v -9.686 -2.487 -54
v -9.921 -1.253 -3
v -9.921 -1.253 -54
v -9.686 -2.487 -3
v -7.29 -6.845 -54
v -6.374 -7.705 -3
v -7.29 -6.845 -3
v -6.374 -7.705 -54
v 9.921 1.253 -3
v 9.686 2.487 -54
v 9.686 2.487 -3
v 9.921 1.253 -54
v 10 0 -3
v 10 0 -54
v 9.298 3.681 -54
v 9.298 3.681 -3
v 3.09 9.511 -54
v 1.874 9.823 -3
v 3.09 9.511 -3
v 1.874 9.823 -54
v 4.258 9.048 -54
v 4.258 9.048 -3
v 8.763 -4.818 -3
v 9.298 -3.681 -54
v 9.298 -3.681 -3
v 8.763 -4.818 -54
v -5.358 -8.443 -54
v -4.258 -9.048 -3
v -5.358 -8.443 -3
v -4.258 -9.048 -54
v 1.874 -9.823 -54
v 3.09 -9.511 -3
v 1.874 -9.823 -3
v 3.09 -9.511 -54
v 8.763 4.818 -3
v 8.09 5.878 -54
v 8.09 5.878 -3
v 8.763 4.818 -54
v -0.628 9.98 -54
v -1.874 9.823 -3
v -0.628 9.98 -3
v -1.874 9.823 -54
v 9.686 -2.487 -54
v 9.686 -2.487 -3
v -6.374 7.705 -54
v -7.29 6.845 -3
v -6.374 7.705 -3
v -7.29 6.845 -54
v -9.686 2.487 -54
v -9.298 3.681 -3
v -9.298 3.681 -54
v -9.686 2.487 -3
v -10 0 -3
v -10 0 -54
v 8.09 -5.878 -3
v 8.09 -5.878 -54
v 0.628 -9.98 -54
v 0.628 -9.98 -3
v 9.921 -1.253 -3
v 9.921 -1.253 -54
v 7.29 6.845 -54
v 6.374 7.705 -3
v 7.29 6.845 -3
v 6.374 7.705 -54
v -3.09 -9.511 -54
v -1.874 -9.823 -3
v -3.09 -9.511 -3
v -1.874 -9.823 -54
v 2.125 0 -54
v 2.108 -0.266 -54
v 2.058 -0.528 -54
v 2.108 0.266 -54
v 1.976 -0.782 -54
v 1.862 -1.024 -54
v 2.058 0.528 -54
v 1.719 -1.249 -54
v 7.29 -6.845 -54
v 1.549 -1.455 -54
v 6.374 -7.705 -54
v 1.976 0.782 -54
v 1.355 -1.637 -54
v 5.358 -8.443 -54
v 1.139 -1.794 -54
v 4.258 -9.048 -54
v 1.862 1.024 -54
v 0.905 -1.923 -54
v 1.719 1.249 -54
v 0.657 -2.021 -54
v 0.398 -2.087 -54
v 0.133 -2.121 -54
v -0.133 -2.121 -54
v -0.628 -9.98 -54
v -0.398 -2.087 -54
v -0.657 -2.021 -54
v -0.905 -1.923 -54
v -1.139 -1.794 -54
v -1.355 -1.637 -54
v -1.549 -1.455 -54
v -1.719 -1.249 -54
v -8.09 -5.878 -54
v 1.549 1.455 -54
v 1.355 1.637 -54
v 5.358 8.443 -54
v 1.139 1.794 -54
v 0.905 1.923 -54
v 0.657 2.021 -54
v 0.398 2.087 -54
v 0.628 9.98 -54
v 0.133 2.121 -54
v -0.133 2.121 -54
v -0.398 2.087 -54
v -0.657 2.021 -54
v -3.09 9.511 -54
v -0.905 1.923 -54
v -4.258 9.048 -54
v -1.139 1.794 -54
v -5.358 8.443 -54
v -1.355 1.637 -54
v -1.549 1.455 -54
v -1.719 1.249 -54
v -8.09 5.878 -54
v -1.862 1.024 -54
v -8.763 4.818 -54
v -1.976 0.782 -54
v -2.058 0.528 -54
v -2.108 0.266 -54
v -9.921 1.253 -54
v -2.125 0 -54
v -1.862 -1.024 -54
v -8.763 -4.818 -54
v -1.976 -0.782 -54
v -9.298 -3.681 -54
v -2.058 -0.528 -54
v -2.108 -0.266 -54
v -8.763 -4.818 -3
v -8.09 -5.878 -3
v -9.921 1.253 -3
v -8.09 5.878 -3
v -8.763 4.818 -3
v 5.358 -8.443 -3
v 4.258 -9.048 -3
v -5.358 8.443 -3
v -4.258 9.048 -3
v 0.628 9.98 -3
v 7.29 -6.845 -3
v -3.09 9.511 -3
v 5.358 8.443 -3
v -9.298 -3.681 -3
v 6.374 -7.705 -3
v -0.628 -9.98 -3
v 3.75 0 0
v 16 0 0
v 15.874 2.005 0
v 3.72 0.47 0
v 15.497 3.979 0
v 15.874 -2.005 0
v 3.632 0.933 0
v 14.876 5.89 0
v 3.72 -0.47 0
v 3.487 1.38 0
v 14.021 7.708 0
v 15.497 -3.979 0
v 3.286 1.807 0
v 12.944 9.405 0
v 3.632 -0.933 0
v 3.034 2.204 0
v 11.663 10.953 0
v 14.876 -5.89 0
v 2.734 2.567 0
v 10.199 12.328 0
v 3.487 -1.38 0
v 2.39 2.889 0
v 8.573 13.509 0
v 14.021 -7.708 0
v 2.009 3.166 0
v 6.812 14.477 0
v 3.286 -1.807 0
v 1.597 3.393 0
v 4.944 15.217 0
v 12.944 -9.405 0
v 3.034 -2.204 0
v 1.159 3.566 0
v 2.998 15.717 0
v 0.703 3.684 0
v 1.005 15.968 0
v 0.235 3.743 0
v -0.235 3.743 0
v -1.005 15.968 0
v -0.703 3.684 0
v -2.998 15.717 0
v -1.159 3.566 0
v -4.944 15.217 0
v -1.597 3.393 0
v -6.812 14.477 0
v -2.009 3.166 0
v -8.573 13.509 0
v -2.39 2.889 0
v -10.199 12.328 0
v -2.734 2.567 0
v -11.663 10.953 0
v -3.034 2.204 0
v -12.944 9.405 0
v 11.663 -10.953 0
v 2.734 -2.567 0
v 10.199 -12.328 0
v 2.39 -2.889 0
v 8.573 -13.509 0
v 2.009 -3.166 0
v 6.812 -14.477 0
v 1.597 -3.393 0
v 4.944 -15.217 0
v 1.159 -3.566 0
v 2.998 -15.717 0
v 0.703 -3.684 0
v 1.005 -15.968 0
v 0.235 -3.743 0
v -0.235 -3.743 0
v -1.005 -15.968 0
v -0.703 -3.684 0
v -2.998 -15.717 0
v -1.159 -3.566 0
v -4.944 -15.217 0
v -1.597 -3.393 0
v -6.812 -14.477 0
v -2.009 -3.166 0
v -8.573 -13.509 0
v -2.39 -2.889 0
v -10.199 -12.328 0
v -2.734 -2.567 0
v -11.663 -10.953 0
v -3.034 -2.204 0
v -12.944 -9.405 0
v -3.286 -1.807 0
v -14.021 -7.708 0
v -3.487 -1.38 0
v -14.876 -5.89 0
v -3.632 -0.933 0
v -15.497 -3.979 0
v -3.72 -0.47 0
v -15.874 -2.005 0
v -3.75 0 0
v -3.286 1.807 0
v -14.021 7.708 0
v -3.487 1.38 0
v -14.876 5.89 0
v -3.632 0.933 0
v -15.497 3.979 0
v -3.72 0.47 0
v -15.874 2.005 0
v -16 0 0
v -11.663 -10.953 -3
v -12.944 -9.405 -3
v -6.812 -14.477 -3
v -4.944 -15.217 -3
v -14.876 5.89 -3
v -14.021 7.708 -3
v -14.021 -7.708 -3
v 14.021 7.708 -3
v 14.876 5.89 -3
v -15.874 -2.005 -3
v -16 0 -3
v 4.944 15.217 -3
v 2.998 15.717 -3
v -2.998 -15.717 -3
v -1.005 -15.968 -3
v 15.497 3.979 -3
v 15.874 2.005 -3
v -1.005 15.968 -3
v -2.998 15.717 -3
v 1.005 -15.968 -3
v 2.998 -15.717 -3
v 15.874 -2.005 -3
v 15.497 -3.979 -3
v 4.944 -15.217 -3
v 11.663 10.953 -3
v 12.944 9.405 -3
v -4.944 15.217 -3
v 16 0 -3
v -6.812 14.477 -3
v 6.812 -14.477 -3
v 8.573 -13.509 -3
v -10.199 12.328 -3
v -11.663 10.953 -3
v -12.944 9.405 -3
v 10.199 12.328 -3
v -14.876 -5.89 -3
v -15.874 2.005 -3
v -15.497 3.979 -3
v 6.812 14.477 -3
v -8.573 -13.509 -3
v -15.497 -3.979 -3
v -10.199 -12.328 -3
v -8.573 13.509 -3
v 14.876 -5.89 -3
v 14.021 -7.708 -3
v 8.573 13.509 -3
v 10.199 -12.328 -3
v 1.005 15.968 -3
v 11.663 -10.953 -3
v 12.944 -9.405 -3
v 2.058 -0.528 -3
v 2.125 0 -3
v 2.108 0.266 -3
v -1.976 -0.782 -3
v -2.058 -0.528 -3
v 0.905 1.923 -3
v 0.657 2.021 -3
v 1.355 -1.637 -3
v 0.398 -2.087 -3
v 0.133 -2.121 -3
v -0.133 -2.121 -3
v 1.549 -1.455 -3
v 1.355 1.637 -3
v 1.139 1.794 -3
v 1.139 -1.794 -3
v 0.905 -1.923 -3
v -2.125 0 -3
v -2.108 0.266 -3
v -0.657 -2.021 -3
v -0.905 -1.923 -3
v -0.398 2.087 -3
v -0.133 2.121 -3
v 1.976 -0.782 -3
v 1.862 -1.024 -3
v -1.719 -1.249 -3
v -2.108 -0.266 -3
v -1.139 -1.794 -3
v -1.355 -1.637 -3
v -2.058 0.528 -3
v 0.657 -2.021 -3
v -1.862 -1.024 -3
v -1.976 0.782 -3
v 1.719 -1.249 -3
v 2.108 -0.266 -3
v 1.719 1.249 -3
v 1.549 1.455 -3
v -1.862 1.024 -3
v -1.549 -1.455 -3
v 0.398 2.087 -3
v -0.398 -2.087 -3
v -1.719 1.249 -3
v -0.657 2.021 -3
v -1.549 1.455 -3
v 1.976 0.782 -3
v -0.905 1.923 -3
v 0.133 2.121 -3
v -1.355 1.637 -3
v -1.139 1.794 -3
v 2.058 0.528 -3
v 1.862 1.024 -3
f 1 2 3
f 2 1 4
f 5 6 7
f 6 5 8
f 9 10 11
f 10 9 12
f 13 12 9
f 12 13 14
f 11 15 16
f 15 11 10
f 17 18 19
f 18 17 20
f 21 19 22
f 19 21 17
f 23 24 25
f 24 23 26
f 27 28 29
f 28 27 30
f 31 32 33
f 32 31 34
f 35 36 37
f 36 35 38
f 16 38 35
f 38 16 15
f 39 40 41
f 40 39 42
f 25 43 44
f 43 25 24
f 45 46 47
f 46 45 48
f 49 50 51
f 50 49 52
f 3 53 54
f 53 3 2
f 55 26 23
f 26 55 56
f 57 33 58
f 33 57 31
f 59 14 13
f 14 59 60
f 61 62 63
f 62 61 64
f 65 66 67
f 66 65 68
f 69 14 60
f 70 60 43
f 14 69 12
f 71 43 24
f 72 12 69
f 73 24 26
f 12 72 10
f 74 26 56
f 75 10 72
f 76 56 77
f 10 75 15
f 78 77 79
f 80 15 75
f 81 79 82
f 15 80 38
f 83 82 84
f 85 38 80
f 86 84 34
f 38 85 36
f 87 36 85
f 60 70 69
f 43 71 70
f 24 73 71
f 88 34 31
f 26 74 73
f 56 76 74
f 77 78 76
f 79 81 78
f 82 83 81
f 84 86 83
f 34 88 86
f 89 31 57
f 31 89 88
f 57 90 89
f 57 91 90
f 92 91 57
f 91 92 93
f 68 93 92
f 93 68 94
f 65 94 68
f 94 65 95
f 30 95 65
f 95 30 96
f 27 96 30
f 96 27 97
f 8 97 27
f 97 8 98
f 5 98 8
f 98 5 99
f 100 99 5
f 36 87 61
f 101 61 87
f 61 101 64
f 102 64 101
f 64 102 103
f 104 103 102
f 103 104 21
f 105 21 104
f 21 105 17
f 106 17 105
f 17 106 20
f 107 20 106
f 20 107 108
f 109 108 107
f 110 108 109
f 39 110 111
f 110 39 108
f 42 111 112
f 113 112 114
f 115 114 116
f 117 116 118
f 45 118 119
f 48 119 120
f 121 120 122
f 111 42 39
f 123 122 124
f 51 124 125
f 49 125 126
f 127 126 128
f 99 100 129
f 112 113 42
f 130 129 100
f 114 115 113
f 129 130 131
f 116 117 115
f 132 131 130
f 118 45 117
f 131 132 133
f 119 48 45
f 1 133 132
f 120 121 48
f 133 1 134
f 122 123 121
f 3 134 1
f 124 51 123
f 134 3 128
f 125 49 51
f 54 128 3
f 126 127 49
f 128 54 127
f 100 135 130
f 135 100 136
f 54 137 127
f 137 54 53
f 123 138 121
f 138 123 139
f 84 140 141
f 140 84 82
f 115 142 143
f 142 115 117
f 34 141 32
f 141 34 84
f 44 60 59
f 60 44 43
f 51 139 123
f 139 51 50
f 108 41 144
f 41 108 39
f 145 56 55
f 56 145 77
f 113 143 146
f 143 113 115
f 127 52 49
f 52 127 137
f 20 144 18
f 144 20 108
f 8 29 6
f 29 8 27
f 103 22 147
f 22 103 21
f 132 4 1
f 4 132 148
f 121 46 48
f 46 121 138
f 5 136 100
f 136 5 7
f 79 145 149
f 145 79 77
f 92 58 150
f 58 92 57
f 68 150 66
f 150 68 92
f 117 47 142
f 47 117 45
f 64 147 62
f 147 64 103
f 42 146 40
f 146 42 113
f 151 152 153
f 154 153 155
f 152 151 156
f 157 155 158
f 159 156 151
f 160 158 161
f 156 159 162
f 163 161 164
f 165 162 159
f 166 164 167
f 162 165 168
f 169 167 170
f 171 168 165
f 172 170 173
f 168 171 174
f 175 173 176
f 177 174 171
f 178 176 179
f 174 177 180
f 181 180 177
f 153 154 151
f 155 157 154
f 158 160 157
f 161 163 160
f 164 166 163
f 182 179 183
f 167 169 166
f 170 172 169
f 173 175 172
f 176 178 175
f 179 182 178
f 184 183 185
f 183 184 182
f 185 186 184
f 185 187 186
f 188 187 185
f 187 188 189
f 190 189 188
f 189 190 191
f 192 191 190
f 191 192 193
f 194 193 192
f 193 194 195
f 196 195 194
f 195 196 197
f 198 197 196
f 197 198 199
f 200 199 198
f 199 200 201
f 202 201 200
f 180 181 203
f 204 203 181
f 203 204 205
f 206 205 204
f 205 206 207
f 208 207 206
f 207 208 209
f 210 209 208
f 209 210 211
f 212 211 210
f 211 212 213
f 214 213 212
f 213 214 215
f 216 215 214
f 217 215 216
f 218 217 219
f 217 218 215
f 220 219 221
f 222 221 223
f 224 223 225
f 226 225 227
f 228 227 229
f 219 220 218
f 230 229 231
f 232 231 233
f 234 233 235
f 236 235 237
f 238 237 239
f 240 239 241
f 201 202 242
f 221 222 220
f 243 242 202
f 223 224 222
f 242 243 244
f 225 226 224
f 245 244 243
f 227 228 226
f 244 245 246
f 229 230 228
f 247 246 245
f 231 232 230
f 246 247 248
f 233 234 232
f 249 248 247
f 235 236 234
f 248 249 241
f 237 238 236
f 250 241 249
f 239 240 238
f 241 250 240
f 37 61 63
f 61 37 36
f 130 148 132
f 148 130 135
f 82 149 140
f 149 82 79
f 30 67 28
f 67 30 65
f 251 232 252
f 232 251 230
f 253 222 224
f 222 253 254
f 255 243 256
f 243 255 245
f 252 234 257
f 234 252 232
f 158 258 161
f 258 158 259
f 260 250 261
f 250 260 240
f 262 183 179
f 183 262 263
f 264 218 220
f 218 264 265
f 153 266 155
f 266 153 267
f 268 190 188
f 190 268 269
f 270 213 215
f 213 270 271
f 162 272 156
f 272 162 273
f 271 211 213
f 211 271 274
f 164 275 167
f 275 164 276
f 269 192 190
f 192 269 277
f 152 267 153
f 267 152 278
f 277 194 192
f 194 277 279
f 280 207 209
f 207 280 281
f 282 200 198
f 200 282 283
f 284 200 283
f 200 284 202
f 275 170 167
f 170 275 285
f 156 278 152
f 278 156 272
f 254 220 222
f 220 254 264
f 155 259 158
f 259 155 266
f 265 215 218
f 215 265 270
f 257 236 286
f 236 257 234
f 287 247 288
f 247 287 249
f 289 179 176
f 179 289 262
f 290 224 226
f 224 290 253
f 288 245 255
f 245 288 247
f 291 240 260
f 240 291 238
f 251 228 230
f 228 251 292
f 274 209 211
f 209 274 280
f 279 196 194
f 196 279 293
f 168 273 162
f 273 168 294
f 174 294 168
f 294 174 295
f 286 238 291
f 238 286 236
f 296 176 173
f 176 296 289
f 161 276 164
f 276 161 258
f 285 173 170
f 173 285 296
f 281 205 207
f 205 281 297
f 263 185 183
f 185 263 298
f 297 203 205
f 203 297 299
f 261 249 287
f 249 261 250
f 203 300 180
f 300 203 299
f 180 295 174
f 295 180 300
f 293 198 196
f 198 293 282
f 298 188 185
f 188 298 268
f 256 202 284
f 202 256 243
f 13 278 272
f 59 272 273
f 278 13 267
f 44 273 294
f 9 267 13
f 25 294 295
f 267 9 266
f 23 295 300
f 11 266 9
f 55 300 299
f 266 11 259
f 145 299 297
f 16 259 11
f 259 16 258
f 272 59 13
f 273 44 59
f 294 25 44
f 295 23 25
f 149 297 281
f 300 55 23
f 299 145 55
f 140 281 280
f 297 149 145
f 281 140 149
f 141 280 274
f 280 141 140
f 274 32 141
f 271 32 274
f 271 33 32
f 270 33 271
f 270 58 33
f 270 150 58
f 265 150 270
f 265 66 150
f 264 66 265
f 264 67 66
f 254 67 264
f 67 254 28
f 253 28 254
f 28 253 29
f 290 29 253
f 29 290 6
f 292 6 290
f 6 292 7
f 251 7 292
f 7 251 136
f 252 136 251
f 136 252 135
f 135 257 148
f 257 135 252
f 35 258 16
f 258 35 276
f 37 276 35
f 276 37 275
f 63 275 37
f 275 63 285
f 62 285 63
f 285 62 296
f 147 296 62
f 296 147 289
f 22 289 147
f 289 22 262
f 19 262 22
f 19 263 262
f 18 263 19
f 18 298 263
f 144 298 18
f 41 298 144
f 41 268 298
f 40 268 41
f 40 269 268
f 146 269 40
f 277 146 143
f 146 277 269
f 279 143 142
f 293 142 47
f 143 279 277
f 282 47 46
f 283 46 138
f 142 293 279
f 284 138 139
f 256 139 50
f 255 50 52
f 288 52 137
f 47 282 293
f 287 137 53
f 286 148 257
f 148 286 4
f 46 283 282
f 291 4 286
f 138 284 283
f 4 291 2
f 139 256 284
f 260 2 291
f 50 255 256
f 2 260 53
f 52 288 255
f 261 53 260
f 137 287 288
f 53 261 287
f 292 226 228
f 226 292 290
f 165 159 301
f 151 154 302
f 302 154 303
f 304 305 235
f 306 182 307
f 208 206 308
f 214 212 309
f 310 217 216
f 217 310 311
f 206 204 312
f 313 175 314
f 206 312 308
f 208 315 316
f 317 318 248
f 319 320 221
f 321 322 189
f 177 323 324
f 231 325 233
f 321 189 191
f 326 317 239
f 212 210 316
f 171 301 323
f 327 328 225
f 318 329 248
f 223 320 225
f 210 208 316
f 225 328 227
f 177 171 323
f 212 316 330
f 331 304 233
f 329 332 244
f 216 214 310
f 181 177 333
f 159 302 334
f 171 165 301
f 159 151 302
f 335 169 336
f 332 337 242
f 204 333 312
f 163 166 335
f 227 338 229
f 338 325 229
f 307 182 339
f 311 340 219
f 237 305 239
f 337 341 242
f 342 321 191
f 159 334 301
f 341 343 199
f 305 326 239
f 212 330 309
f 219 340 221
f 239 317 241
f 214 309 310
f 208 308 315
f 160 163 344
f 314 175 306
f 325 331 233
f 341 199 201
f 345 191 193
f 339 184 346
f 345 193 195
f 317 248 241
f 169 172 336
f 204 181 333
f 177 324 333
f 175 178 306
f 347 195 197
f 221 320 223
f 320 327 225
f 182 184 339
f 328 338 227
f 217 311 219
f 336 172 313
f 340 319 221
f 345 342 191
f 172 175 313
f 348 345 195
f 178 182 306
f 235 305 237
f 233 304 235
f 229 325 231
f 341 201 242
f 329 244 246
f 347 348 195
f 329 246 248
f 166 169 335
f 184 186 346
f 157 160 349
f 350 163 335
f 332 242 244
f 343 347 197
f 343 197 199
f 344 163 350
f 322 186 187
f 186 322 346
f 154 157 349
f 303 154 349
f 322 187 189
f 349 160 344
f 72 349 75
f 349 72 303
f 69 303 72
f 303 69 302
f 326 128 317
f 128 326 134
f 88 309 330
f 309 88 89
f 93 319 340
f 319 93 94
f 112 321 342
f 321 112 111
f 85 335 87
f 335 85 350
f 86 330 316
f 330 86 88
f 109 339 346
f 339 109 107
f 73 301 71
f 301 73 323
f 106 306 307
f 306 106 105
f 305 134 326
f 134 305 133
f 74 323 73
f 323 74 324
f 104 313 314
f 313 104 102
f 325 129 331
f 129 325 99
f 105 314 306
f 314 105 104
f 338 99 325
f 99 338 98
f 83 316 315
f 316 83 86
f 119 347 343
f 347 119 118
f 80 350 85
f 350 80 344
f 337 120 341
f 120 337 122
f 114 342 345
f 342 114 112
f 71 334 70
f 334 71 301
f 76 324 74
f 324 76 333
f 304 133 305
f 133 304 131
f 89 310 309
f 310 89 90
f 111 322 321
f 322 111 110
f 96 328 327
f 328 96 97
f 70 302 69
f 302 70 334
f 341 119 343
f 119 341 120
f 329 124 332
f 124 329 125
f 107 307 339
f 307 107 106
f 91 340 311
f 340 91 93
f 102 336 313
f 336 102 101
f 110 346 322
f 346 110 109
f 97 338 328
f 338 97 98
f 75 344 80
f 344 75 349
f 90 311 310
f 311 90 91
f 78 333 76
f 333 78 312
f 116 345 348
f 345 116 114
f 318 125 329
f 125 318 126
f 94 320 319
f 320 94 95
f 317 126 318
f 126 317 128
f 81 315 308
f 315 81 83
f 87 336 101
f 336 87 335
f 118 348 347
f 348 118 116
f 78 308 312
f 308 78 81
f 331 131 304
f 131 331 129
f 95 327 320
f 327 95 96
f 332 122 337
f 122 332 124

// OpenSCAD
$fn = 50;


difference() {
	union() {
		translate(v = [0, 0, -54.0000000000]) {
			cylinder(h = 54, r = 10.0000000000);
		}
		translate(v = [0, 0, -3.0000000000]) {
			cylinder(h = 3, r = 16.0000000000);
		}
	}
	union() {
		translate(v = [0, 0, 0]) {
			rotate(a = [0, 0, 0]) {
				difference() {
					union() {
						#translate(v = [0, 0, -54.0000000000]) {
							cylinder(h = 54, r = 2.0000000000);
						}
						#translate(v = [0, 0, -3]) {
							cylinder(h = 3, r = 10.0000000000, r1 = 2.1250000000, r2 = 3.7500000000);
						}
						#translate(v = [0, 0, -54.0000000000]) {
							cylinder(h = 54, r = 2.1250000000);
						}
						#translate(v = [0, 0, -54.0000000000]) {
							cylinder(h = 54, r = 2.0000000000);
						}
					}
					union();
				}
			}
		}
	}
}
